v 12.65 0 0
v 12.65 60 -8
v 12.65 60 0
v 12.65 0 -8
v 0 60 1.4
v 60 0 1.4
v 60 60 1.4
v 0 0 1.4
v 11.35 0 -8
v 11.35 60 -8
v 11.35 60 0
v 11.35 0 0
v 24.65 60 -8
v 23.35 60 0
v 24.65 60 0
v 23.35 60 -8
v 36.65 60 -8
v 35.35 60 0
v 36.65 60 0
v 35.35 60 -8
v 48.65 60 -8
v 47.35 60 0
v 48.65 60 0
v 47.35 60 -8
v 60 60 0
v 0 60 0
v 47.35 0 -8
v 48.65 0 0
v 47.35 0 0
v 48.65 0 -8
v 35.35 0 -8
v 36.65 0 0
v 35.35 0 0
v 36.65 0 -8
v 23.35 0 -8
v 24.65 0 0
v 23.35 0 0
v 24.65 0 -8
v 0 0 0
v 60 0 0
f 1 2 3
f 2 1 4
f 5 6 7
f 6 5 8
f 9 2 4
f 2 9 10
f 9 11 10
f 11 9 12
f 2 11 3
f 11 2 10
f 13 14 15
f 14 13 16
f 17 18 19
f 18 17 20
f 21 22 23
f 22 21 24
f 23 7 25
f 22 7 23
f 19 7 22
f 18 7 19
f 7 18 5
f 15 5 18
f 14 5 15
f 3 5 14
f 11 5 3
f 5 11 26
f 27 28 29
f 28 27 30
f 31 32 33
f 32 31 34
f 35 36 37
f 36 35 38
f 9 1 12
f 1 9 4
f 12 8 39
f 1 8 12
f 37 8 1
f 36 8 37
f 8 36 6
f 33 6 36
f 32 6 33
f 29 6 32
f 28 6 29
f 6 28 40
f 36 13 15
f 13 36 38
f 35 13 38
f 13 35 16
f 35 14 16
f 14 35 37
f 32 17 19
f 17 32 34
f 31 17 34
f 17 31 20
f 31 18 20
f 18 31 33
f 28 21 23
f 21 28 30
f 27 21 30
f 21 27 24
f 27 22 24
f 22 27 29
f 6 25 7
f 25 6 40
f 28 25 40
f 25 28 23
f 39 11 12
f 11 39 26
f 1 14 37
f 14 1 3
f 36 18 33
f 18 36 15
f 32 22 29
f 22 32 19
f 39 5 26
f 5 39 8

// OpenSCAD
$fn = 32;

// ----------------------------------------------------------------------
// Ribbed panel: 1.4 mm panel
// ----------------------------------------------------------------------

// --- parameters (mm) ---
panel_l = 60;             // panel length, X
panel_w = 60;             // panel width, Y
panel_t = 1.4;            // panel thickness, Z
rib_t = 1.3;              // rib thickness
rib_h = 8;                // rib height below the panel
ribs = 4;                 // number of ribs
fit_tol = 0.05;           // tolerance for press fits, mm
free_tol = 0.2;           // tolerance for clearance fits, mm

total_h = panel_t + rib_h;  // overall height

union() {
  cube([panel_l, panel_w, panel_t]);
  for (i = [1 : ribs])
    translate([i * panel_l / (ribs + 1) - rib_t / 2, 0, -rib_h])
      cube([rib_t, panel_w, rib_h + panel_t]);
}
